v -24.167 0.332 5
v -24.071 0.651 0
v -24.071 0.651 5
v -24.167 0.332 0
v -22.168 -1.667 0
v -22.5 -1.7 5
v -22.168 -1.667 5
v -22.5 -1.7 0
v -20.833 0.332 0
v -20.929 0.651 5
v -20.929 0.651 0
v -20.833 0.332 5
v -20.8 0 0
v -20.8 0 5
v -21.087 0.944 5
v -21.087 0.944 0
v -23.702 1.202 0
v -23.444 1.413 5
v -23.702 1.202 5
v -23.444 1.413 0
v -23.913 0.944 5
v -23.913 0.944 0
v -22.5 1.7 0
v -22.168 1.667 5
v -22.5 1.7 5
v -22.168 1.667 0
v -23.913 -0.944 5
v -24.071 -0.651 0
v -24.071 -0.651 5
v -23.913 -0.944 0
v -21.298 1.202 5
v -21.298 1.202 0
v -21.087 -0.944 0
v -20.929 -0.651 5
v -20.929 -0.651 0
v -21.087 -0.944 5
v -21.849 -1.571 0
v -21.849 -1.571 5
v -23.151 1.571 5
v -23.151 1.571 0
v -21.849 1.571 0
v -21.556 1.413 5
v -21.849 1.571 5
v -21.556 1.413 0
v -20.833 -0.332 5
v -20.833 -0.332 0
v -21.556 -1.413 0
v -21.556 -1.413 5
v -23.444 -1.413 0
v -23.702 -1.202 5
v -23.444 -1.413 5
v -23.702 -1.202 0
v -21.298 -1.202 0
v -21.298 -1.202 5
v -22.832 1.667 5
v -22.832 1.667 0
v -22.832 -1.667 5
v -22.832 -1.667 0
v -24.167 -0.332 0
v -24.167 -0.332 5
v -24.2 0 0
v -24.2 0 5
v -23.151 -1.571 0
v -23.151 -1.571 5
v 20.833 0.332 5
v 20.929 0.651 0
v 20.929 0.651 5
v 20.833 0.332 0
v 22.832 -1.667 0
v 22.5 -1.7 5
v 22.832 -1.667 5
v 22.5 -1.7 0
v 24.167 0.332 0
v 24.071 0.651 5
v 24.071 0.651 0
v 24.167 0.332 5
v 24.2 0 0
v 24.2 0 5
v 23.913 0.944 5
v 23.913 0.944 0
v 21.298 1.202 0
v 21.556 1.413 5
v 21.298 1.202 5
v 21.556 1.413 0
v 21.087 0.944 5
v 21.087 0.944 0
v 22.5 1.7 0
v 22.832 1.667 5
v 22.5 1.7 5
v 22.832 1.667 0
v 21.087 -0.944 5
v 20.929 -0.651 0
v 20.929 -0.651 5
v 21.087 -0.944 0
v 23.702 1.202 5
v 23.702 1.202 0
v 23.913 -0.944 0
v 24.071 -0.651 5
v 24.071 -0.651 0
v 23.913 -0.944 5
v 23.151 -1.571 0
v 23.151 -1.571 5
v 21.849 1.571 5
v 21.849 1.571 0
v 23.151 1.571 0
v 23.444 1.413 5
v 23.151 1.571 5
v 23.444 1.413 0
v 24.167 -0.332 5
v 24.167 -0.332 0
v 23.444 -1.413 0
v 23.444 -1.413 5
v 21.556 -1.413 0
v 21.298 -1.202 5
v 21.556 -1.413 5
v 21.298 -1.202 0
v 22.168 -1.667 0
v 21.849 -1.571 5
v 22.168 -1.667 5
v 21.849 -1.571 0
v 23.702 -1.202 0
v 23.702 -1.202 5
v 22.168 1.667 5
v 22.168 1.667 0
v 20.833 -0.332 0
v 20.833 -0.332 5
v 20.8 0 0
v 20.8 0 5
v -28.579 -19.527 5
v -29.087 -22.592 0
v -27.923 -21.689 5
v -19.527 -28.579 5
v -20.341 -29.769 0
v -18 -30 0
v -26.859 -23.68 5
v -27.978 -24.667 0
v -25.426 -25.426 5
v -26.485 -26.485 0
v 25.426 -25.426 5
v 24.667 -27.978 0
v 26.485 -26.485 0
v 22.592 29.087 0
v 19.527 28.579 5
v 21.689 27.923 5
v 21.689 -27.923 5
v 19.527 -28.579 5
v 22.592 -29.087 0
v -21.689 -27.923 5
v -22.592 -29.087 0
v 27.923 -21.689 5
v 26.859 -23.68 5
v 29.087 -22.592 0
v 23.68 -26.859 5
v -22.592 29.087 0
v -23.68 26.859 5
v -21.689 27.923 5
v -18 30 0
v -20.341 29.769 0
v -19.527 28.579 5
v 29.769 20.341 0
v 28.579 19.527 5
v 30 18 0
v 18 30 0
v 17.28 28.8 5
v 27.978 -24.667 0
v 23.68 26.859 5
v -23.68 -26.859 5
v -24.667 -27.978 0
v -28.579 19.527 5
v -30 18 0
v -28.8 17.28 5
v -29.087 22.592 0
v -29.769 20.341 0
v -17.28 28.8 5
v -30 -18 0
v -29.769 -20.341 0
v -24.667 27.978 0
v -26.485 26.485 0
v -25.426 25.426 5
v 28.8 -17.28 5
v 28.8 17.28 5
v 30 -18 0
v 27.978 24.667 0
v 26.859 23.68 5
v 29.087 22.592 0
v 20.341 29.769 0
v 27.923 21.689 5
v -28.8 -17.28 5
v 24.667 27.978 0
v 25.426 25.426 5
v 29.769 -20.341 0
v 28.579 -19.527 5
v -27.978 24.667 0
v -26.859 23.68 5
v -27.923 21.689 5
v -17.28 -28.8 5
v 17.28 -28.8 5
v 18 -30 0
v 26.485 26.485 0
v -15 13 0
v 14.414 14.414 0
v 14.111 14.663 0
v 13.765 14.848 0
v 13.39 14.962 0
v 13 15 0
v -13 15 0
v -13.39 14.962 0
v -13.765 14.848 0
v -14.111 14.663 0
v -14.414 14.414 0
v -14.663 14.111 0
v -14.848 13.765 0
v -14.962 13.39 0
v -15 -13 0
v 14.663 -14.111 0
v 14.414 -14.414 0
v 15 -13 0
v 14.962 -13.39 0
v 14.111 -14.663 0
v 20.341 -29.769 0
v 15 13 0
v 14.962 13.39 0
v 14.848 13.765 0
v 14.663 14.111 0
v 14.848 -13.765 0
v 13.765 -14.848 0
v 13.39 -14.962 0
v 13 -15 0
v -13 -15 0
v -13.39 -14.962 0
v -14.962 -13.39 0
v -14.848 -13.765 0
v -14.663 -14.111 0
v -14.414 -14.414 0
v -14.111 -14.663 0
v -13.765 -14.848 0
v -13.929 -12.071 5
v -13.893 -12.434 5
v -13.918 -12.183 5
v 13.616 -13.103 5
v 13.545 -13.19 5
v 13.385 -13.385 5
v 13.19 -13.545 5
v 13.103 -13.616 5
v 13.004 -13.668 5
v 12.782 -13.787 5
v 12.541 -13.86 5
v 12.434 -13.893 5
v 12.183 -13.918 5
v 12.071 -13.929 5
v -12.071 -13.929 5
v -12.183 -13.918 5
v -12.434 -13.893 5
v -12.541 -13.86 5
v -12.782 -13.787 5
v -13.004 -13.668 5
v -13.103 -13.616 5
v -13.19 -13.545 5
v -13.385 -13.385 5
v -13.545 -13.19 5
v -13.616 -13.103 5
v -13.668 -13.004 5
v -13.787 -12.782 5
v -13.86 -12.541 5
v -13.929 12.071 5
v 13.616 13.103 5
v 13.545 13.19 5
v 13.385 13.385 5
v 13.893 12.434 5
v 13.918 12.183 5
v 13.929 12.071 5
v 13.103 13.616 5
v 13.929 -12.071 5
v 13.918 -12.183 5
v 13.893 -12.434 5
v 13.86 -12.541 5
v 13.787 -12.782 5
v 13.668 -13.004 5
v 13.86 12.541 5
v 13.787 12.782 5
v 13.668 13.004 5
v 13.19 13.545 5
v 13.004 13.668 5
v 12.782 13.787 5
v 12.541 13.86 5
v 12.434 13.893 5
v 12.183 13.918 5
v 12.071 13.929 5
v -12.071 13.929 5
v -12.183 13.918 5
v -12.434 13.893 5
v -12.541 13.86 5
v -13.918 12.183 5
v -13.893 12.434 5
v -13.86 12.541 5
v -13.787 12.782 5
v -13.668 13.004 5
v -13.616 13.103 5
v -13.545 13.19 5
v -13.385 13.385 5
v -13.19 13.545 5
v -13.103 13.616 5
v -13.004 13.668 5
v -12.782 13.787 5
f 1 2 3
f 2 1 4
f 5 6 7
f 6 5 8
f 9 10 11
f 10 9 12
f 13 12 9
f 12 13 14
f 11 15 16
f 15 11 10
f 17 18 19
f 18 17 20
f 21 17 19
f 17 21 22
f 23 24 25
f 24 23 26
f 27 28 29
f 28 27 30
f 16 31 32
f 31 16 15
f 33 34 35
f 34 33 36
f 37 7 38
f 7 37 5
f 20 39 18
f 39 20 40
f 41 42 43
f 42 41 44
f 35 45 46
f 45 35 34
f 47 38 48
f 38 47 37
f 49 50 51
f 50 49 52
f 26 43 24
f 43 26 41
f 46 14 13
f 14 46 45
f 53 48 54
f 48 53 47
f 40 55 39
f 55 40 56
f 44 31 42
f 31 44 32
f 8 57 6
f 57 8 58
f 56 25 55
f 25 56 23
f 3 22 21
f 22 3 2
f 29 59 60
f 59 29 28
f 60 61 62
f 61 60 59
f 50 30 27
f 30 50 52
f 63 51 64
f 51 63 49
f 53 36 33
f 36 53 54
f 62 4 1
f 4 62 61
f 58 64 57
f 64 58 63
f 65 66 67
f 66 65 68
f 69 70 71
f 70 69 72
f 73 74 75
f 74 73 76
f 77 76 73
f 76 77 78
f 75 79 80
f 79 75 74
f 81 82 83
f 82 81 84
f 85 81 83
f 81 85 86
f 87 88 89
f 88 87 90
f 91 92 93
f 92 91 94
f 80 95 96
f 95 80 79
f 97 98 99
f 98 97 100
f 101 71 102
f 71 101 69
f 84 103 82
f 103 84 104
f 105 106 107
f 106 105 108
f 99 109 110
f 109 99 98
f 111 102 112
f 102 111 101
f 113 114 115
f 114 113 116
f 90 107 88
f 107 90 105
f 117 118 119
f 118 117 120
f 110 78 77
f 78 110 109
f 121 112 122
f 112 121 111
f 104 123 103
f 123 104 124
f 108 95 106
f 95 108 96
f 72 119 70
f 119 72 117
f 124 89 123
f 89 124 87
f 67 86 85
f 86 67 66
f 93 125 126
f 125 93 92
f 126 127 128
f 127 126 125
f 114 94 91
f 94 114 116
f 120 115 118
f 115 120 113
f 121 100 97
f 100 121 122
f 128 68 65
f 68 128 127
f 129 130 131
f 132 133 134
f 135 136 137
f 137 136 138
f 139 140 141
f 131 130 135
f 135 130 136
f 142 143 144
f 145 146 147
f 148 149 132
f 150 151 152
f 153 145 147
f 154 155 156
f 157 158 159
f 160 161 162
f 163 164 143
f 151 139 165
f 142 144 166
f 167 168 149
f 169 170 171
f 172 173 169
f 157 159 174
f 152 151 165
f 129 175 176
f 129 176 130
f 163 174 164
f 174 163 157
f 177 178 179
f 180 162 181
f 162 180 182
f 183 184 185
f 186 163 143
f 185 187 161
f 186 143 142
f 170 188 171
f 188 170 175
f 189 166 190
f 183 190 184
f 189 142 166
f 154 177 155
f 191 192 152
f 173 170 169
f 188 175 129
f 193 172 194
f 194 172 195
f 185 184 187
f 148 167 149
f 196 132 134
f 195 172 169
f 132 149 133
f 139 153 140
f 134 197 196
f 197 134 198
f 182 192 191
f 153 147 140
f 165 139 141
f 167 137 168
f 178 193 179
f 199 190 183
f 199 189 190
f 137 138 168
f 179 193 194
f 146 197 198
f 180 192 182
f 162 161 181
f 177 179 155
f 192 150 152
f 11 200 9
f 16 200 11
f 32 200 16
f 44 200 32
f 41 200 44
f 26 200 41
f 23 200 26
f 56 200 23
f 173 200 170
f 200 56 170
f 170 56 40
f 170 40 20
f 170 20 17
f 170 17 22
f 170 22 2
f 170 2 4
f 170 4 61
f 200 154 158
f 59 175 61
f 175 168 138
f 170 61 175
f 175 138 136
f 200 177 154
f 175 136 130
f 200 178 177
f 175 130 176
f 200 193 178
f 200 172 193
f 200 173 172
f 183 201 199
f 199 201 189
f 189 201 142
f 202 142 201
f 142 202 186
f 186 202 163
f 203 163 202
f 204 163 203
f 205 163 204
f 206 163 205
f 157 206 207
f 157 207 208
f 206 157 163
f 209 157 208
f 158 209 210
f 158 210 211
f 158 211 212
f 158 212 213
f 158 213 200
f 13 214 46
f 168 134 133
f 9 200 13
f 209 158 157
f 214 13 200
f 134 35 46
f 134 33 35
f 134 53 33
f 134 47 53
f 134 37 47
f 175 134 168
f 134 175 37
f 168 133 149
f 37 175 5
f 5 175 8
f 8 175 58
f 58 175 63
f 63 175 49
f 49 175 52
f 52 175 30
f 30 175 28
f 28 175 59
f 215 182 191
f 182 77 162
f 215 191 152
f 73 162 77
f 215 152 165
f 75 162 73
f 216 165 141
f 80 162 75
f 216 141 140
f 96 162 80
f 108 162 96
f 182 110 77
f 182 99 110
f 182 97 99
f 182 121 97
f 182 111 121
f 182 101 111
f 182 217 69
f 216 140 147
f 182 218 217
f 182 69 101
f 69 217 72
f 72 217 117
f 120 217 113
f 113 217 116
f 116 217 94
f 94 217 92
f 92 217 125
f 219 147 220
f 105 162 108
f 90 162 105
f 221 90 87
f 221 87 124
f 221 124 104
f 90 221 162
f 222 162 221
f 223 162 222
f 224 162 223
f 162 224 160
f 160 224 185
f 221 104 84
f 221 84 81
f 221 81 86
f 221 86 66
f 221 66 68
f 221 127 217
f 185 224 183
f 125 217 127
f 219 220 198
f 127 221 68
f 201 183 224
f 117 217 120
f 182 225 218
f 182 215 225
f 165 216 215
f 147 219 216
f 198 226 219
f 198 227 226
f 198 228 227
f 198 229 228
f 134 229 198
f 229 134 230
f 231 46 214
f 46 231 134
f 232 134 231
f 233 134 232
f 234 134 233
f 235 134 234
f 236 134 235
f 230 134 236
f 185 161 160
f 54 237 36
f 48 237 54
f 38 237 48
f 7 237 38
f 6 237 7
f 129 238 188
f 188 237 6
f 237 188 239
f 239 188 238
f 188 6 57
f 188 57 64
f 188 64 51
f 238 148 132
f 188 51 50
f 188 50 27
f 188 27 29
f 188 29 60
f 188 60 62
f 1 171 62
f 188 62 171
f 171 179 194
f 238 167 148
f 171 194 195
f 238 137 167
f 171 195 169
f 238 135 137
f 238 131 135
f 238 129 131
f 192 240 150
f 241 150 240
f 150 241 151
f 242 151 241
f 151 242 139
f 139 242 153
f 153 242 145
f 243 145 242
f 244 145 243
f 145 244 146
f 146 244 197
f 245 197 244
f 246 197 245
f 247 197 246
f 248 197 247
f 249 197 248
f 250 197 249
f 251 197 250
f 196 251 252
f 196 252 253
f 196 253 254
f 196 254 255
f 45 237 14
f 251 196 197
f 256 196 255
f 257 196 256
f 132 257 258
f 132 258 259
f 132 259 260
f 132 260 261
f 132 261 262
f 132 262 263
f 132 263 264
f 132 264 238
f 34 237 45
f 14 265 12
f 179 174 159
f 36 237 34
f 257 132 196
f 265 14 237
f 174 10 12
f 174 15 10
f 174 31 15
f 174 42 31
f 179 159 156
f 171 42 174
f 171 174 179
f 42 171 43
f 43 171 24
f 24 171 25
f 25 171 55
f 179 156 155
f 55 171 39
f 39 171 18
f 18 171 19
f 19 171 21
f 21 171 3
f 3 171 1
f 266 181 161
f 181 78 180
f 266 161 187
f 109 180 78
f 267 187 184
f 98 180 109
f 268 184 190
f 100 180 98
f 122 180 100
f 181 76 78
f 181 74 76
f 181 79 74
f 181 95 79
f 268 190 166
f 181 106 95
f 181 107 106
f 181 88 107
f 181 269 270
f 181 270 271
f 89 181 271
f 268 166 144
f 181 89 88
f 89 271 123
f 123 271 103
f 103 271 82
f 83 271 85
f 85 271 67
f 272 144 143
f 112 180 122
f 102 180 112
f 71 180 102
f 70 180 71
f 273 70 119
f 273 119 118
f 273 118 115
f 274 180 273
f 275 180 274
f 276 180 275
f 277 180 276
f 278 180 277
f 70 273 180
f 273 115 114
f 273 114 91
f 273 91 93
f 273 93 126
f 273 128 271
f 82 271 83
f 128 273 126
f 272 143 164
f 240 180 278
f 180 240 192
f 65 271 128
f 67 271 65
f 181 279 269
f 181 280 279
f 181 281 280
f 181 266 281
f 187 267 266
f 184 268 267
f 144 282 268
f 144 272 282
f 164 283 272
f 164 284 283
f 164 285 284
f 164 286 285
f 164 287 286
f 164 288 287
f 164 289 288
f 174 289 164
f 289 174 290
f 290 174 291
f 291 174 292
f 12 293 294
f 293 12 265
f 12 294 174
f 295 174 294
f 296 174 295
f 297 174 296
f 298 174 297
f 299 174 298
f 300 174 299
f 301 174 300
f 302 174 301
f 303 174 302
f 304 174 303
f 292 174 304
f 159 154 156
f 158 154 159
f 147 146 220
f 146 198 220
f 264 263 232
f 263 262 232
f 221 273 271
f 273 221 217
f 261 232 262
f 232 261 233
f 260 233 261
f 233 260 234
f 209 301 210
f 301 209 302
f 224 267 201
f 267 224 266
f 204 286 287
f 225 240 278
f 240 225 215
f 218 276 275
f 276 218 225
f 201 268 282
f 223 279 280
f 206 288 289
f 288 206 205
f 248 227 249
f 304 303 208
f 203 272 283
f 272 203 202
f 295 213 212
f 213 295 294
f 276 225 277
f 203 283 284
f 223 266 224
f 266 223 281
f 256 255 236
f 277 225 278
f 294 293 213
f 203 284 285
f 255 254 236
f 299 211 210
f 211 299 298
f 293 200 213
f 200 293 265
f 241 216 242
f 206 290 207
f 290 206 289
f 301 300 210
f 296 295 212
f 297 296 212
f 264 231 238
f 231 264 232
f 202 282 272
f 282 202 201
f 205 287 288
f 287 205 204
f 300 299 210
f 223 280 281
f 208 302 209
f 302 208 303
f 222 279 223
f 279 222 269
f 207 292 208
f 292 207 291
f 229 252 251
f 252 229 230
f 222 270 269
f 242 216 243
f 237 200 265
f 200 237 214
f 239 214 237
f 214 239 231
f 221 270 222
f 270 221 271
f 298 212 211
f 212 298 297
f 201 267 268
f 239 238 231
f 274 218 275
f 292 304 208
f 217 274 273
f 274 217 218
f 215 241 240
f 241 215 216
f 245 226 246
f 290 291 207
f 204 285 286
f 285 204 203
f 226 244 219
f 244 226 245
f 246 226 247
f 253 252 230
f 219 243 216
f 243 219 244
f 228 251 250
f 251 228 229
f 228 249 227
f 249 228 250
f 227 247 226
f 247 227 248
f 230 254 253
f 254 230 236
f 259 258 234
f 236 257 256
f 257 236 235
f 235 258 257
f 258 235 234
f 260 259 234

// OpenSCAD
$fn = 32;

// ----------------------------------------------------------------------
// Display bezel: 60 x 60 mm frame, opening 30x30 mm
// ----------------------------------------------------------------------

// --- parameters (mm) ---
length = 60;              // frame outside length, X
width = 60;               // frame outside width, Y
frame_w = 15;             // frame width
thickness = 5;            // frame thickness
corner_r = 12;            // outside corner radius
chamfer = 0.96;           // outer wall taper
funnel = 0.9;             // inner opening taper
opening_l = 30;           // opening length
opening_w = 30;           // opening width
inner_r = 2;              // opening corner radius
hole_d = 3.4;             // mounting screw clearance
holes_per_side = 1;       // holes per short side
hole_inset = 7.5;         // hole centre inset from the outside edge

/* rounded-rectangle outlines, generated with loops */
module rounded_ring(l_nom, w_nom, r) {
  hull() {
    for (sx = [-1, 1]) for (sy = [-1, 1])
      translate([sx * (l_nom / 2 - r), sy * (w_nom / 2 - r)]) circle(r = r);
  }
}

difference() {
  /* frame body, drafted so the outer edge is a variable-depth chamfer */
  linear_extrude(height = thickness, scale = chamfer)
    rounded_ring(length, width, corner_r);
  /* viewing opening, drafted the other way for a funnel edge */
  linear_extrude(height = thickness + 2, scale = funnel)
    translate([0, 0, -1]) rounded_ring(opening_l, opening_w, inner_r);
  /* mounting screws through the frame lands */
  for (sx = [-1, 1]) for (i = [1 : holes_per_side])
    translate([sx * (length / 2 - hole_inset),
               (i - (holes_per_side + 1) / 2) * width * 0.5, -1])
      cylinder(h = thickness + 2, d = hole_d);
}
